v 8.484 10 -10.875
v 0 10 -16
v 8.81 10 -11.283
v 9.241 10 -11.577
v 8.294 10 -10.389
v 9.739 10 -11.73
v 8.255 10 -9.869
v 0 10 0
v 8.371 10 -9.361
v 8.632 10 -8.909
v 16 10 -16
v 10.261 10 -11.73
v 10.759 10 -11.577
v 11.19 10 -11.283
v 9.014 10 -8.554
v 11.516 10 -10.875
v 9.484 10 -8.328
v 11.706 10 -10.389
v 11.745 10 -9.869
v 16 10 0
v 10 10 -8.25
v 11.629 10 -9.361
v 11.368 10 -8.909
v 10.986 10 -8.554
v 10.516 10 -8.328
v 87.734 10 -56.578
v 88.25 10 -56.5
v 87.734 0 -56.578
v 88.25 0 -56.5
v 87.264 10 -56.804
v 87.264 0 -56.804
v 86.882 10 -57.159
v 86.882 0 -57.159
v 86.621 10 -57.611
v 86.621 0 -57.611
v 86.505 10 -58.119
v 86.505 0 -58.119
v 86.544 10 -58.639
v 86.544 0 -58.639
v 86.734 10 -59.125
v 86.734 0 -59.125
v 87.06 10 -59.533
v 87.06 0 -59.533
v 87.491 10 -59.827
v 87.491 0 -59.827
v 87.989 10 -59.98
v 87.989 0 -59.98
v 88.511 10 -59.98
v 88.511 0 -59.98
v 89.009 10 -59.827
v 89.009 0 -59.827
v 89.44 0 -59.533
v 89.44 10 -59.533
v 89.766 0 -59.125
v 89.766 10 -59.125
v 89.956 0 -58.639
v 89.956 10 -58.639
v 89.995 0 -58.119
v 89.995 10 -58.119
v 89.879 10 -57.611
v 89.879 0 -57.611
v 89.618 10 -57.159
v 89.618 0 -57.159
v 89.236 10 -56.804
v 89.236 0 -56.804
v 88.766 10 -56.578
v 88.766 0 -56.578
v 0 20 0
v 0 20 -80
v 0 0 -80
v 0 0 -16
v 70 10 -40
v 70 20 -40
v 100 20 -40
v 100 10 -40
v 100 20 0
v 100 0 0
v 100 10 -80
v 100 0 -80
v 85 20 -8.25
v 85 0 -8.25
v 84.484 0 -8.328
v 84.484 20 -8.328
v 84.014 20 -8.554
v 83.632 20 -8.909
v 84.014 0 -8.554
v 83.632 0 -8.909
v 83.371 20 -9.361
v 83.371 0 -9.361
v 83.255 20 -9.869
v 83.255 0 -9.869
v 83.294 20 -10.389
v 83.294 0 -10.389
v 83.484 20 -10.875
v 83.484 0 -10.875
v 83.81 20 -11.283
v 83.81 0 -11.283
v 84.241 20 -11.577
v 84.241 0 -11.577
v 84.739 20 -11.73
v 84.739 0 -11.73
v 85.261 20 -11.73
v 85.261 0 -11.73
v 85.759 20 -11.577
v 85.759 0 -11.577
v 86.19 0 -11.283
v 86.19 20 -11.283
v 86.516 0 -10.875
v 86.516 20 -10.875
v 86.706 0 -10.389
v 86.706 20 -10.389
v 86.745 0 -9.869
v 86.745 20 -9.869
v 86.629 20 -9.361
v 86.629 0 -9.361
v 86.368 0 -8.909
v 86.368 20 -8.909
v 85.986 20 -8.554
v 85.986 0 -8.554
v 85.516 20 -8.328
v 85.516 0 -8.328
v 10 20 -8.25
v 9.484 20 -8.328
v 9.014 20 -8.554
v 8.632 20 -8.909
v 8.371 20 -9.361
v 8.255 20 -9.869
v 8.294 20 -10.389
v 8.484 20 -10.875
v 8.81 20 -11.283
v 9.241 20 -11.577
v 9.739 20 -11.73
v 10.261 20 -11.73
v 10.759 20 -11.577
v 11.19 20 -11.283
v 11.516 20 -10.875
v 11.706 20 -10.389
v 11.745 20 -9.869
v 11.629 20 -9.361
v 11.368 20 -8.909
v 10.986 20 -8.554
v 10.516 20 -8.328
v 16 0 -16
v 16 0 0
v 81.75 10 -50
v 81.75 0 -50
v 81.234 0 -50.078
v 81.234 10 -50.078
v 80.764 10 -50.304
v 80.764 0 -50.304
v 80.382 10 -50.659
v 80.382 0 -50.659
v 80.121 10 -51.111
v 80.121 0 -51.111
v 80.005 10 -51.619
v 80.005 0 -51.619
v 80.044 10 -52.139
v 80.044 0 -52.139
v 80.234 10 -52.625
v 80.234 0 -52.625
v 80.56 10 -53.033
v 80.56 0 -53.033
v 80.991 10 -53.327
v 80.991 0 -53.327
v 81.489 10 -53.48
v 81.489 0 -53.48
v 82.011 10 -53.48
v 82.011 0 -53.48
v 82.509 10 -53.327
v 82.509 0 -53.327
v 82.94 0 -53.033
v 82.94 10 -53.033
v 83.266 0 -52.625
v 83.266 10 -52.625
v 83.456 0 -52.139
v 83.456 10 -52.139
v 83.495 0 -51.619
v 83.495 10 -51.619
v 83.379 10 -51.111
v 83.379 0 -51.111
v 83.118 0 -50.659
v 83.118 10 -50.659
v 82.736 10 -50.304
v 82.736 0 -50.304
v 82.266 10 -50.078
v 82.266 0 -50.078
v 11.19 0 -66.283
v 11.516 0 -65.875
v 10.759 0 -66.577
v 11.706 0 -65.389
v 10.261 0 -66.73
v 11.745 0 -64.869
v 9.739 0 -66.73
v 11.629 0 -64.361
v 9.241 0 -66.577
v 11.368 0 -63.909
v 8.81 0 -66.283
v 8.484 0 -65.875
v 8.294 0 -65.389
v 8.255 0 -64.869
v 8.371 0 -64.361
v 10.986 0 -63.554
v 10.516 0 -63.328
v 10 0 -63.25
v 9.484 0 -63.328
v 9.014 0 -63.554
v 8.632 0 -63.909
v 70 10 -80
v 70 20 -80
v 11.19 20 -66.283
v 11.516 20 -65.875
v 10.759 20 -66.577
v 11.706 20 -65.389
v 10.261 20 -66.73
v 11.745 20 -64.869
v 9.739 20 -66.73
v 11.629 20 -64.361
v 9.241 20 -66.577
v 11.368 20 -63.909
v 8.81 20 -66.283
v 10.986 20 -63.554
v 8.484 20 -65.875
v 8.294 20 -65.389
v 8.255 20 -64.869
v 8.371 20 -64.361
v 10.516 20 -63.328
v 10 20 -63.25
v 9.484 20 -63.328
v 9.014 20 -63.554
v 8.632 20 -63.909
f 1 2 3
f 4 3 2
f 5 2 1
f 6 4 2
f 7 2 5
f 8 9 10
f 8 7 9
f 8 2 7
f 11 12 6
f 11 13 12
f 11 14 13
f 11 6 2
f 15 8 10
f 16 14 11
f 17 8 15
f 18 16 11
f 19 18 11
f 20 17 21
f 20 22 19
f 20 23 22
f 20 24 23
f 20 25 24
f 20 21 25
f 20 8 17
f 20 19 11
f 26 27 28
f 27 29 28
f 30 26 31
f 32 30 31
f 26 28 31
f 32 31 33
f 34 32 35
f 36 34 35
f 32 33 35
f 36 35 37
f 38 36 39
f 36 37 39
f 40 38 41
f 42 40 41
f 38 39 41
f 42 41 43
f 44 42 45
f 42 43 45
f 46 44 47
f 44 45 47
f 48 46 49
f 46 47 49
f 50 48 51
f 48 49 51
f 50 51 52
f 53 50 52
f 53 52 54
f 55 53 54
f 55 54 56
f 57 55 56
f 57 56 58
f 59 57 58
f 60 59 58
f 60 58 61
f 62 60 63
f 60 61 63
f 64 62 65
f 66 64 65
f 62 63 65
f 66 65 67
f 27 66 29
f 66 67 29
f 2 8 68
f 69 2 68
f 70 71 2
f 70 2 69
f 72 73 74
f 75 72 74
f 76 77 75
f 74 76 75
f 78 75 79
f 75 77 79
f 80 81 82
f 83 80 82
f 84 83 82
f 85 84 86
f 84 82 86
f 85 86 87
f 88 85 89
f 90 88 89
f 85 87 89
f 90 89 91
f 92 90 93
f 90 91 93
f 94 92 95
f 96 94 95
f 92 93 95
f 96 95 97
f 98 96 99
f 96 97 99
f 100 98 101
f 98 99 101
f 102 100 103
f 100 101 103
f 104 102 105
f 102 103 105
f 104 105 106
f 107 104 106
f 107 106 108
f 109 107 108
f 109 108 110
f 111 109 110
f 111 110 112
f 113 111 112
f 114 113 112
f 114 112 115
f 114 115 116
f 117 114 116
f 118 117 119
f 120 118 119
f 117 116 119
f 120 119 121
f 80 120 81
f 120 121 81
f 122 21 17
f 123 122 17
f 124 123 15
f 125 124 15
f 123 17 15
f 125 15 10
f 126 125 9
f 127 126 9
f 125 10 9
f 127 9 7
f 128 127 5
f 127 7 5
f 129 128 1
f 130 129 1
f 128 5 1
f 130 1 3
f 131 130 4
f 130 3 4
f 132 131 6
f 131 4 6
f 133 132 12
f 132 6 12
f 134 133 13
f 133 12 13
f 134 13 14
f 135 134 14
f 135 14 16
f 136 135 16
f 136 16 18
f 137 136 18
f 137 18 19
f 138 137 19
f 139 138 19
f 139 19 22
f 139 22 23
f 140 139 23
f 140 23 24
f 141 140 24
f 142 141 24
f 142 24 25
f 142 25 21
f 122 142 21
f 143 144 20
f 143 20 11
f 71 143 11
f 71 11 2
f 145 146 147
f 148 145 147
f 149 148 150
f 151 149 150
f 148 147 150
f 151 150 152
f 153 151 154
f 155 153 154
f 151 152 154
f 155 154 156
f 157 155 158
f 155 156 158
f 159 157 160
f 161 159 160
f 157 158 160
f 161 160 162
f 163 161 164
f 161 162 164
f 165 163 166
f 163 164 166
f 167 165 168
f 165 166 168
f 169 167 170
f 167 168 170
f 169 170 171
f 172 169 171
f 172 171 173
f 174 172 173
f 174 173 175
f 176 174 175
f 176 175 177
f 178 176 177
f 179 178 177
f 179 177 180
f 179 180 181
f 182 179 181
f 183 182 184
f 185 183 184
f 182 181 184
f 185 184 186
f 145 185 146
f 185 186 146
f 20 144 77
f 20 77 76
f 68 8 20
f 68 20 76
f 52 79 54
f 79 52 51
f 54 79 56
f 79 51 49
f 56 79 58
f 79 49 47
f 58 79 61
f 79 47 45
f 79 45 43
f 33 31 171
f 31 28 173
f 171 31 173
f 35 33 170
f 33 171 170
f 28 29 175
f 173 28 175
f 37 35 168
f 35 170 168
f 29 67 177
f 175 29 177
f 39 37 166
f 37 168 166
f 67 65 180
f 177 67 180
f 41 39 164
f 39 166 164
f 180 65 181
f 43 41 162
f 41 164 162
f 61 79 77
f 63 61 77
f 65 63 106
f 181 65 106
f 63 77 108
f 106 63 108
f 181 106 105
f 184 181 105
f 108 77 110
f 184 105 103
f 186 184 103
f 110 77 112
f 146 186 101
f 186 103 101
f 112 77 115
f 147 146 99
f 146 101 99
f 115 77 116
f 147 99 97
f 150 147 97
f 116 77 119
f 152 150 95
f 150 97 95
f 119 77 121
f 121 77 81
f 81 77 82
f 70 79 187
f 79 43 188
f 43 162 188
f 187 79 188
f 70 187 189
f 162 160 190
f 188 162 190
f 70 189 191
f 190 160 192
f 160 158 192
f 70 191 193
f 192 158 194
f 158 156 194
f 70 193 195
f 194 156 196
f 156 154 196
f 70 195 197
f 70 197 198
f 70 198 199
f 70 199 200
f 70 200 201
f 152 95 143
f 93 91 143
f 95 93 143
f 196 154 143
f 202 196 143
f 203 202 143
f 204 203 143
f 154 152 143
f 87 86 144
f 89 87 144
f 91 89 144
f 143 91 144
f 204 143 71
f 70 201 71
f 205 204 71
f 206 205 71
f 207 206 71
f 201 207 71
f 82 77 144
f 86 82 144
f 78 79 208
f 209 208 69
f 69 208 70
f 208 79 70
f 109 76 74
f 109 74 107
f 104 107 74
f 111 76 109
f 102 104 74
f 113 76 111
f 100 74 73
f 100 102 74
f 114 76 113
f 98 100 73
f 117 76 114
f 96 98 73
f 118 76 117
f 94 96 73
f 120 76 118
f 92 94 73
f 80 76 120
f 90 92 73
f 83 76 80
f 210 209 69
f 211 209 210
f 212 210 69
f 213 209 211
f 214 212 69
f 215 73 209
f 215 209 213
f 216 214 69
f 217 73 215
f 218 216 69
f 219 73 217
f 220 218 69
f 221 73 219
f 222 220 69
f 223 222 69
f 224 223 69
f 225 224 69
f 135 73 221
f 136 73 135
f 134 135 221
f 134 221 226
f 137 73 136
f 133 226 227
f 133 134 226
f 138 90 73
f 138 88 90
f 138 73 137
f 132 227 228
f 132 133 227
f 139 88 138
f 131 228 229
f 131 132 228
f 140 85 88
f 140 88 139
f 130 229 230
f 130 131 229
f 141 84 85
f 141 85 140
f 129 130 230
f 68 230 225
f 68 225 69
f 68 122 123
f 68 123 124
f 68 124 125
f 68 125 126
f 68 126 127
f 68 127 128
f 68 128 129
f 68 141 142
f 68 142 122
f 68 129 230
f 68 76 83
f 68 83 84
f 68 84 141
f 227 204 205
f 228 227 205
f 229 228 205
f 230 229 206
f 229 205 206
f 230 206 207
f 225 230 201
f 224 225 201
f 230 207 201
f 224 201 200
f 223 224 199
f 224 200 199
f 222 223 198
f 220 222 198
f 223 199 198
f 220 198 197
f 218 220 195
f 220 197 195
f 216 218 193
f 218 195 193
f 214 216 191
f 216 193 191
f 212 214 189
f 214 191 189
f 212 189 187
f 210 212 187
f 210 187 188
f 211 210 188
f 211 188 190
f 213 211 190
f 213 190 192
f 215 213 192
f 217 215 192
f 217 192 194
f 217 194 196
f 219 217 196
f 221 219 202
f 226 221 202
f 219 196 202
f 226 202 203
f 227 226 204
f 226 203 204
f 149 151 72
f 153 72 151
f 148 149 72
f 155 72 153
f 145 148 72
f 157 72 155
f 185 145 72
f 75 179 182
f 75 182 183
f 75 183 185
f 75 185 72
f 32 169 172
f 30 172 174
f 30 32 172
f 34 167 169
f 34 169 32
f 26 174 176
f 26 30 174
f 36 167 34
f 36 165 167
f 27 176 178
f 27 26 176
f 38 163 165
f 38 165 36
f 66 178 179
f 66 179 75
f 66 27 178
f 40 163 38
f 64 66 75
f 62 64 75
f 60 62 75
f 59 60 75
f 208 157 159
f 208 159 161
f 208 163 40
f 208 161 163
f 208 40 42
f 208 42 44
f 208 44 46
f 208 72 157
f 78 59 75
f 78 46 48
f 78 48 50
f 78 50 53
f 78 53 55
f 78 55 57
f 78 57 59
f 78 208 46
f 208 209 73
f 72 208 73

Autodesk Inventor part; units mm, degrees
ref_plane "YZ Plane" through (0, 0, 0) normal (1, 0, 0) x (0, 1, 0)
ref_plane "XZ Plane" through (0, 0, 0) normal (0, 1, 0) x (-1, 0, 0)
ref_plane "XY Plane" through (0, 0, 0) normal (0, 0, 1) x (1, 0, 0)
sketch "Boceto1" plane through (0, 0, 0) normal (0, 1, 0) x (-1, 0, 0)
  line L0 (100, 80) -> (-100, 80)
  line L1 (-100, 80) -> (-100, -80)
  line L2 (-100, -80) -> (100, -80)
  line L3 (100, -80) -> (100, 80)
  line L4 (100, 80) -> (-100, -80) construction
  line L5 (-100, 80) -> (100, -80) construction
  point P0 (0, 0)
  dimension "d0" = 200
  dimension "d1" = 160
extrude "Extrusión1" add sketch "Boceto1" along normal blind 20
sketch "Boceto2" plane through (0, 20, 0) normal (0, 1, 0) x (1, 0, 0)
  line L0 (-100, 80) -> (-100, -80) projected
  line L1 (-100, 80) -> (-70, 80)
  line L2 (-70, 80) -> (-70, 40)
  line L3 (-70, 40) -> (-100, 40)
  line L4 (-100, 40) -> (-100, 80)
  line L5 (100, 80) -> (-100, 80) projected
  line L6 (0, 80) -> (0, 40)
  line L7 (100, 80) -> (70, 80)
  line L8 (70, 80) -> (70, 40)
  line L9 (70, 40) -> (100, 40)
  line L10 (100, 40) -> (100, 80)
  point P0 (0, 0)
  dimension "d4" = 30
  dimension "d5" = 40
extrude "Extrusión2" cut sketch "Boceto2" against normal blind 10
sketch "Boceto3" plane through (0, 20, 0) normal (0, 1, 0) x (1, 0, 0)
  line L0 (-70, 80) -> (-70, 40) projected
  line L1 (-70, 80.0001) -> (-70, 40)
  line L2 (-70, 40) -> (-100, 40) projected
  line L3 (-100, 40) -> (-100, 80.0001)
  line L4 (-100, 40) -> (-70, 40)
  line L5 (-70, 40) -> (-70, 80)
  line L6 (-70, 80) -> (-100, 80)
  line L7 (-100, 80) -> (-100, 40)
  circle A0 centre (-88.25, 58.25) radius 1.75
  circle A1 centre (-81.75, 51.75) radius 1.75
  line L8 (100, 80) -> (-100, 80) projected
  line L9 (0, 80) -> (0, 56.5)
  circle A2 centre (88.25, 58.25) radius 1.75
  circle A3 centre (81.75, 51.75) radius 1.75
  point P0 (0, 0)
  point P1 (-64.3507, 80)
  point P2 (-74.3507, 0)
  point P3 (-85, 80)
  dimension "d23" = 21.75
  dimension "d24" = 11.75
  dimension "d26" = 11.75
hole "Agujero1" at (-81.75, 20, -51.75) at (-88.25, 20, -58.25) at (81.75, 20, -51.75) at (88.25, 20, -58.25) direction (0, -1, 0) diameter 3.5 end through all
sketch "Boceto4" plane through (-100, 0, 80) normal (0, 0, 1) x (1, 0, 0)
  line L0 (30, 20) -> (60, 20)
  line L1 (60, 20) -> (60, 10)
  line L2 (60, 10) -> (30, 10)
  line L3 (30, 10) -> (30, 20)
  line L4 (0, 0) -> (0, 20) projected
  line L5 (100, 0) -> (100, 10)
  line L6 (170, 20) -> (140, 20)
  line L7 (140, 20) -> (140, 10)
  line L8 (140, 10) -> (170, 10)
  line L9 (170, 10) -> (170, 20)
  dimension "d34" = 30
  dimension "d35" = 10
  dimension "d36" = 30
extrude "Extrusión3" add sketch "Boceto4" along normal blind 40
sketch "Boceto5" plane through (0, 20, 0) normal (0, 1, 0) x (1, 0, 0)
  line L0 (59.9999, -50) -> (69.9999, -50)
  line L1 (49.9999, -101.75) -> (49.9999, -79.9497)
  line L2 (59.9999, -108.25) -> (59.9999, -50)
  line L3 (40, -80) -> (69.9999, -80)
  line L4 (49.9999, -79.9497) -> (40, -80)
  circle A0 centre (51.7499, -101.75) radius 1.75
  circle A1 centre (58.2499, -108.25) radius 1.75
  line L5 (69.9999, -80) -> (69.9999, -120)
  line L6 (40, -120) -> (40, -80)
  line L7 (69.9999, -120) -> (40, -120)
  line L8 (0, -50) -> (0, -71.75)
  line L9 (-40, -120) -> (-40, -80)
  line L10 (-49.9999, -101.75) -> (-49.9999, -79.9497)
  circle A2 centre (-51.7499, -101.75) radius 1.75
  circle A3 centre (-58.2499, -108.25) radius 1.75
  line L11 (-40, -80) -> (-69.9999, -80)
  line L12 (-69.9999, -120) -> (-40, -120)
  line L13 (-69.9999, -80) -> (-69.9999, -120)
  line L14 (-59.9999, -108.25) -> (-59.9999, -50)
  line L15 (-40, -120) -> (-69.9999, -120)
  line L16 (-69.9999, -80) -> (-69.9999, -120)
  line L17 (-40, -120) -> (-70, -120) projected
  line L18 (-40, -80) -> (-40, -120) projected
  line L19 (-59.9999, -110) -> (-49.9999, -110)
  line L20 (-49.9999, -110) -> (-49.9999, -100)
  line L21 (-49.9999, -100) -> (-59.9999, -100)
  line L22 (-59.9999, -100) -> (-59.9999, -110)
  line L23 (-100, 40) -> (-100, -80) projected
  point P0 (0, 0)
  point P1 (-56.75, -68.25)
  point P2 (-63.25, -61.75)
  point P3 (63.25, -61.75)
  point P4 (56.75, -68.25)
  dimension "d45" = 3.5
  dimension "d46" = 3.5
  dimension "d39" = 10
  dimension "d40" = 10
  dimension "d41" = 40
  dimension "d42" = 0
  dimension "d43" = 6.5
  dimension "d44" = 6.5
  dimension "d47" = 11.7499
  dimension "d48" = 11.75
  dimension "d49" = 0
  dimension "d50" = 11.75
  dimension "d51" = 0
  dimension "d97" = 40.0001
hole "Agujero2" at (-58.2499, 20, 108.25) at (-51.7499, 20, 101.75) at (51.7499, 20, 101.75) at (58.2499, 20, 108.25) direction (0, -1, 0) diameter 3.5 end through all
sketch "Boceto6" plane through (0, 20, 0) normal (0, 1, 0) x (1, 0, 0)
  circle A0 centre (-60.569, -13.1067) radius 10
  circle A1 centre (-29.569, -59.1067) radius 3.5
  line L0 (-60.569, -13.1067) -> (-39.0083, -13.1067)
  circle A2 centre (-29.569, 25.8933) radius 3.5
  circle A3 centre (-88.569, 25.8933) radius 3.5
  circle A4 centre (-88.569, -59.1067) radius 3.5
  line L1 (70.4544, -63.0517) -> (18.4544, -63.0517)
  line L2 (18.4544, -63.0517) -> (18.4544, 6.9483)
  line L3 (18.4544, 6.9483) -> (70.4544, 6.9483)
  line L4 (70.4544, 6.9483) -> (70.4544, -63.0517)
  line L5 (70.4544, 6.9483) -> (48.4544, 6.9483)
  line L6 (48.4544, 6.9483) -> (48.4544, 48.9483)
  line L7 (48.4544, 48.9483) -> (70.4544, 48.9483)
  line L8 (70.4544, 48.9483) -> (70.4544, 6.9483)
  line L9 (77.2288, -8.158) -> (77.2281, -5.6604)
  circle A5 centre (63.7706, -5.7606) radius 1.75
  line L10 (70.7641, -24.1464) -> (70.7641, 22.2796)
  circle A6 centre (35.8307, -5.7609) radius 1.75
  line L11 (25.1581, -13.2381) -> (25.1581, -10.7404)
  circle A7 centre (68.8507, -57.8309) radius 1.75
  line L12 (26.4277, 35.0051) -> (26.4277, 37.5029)
  circle A8 centre (20.6074, -56.5614) radius 1.75
  line L13 (18.6941, -55.9176) -> (70.7641, -55.9176)
  line L14 (18.6941, -55.9176) -> (18.6941, -7.6743)
  line L15 (44.7291, -55.9176) -> (44.7291, -31.7959)
  line L16 (63.7706, -28.0517) -> (26.4277, -28.0517)
  line L17 (44.7291, -23.5247) -> (44.7291, -31.7959)
  point P0 (0, 0)
  point P1 (-60.569, -16.6067)
  point P2 (45.425, 12.8886)
  point P3 (44.7291, -28.0517)
  dimension "d59" = 7
  dimension "d60" = 7
  dimension "d61" = 7
  dimension "d62" = 39
  dimension "d63" = 46
  dimension "d64" = 59
  dimension "d65" = 46
  dimension "d66" = 39
  dimension "d67" = 59
  dimension "d68" = 52
  dimension "d69" = 70
  dimension "d70" = 22
  dimension "d71" = 42
  dimension "d72" = 3.5
  dimension "d73" = 3.5
  dimension "d74" = 3.5
  dimension "d75" = 3.5
  dimension "d142" = 17.3763
  dimension "d143" = 12.7092
  dimension "d144" = 6.6837
  dimension "d145" = 12.7089
  dimension "d146" = 5.2208
  dimension "d147" = 1.6037
  dimension "d148" = 2.1531
  dimension "d149" = 6.4903
hole "Agujero3" at (68.8507, 20, 57.8309) at (20.6074, 20, 56.5614) at (63.7706, 20, 5.7606) at (35.8307, 20, 5.7609) direction (0, -1, 0) diameter 3.5 end through all
sketch "Boceto7" plane through (0, 20, 0) normal (0, 1, 0) x (1, 0, 0)
  circle A0 centre (-60.569, -13.1067) radius 10
  circle A1 centre (-29.569, -59.1067) radius 3.5
  line L0 (-60.569, -13.1067) -> (-39.0083, -13.1067)
  circle A2 centre (-29.569, 25.8933) radius 3.5
  circle A3 centre (-88.569, 25.8933) radius 3.5
  circle A4 centre (-88.569, -59.1067) radius 3.5
  point P0 (0, 0)
  point P1 (-60.569, -16.6067)
  dimension "d83" = 7
  dimension "d84" = 7
  dimension "d85" = 7
  dimension "d86" = 39
  dimension "d87" = 46
  dimension "d88" = 59
  dimension "d89" = 46
  dimension "d90" = 39
  dimension "d91" = 59
extrude "Extrusión4" cut sketch "Boceto7" against normal blind 20
ref_plane "Plano de trabajo1" through (0, 0, -80) normal (-1, 0, 0) x (0, 0, 1)
ref_plane "Plano de trabajo2" through (100, 0, 0) normal (0, 0, -1) x (-1, 0, 0)
sketch "Boceto8" plane through (0, 20, 0) normal (0, 1, 0) x (1, 0, 0)
  line L0 (80, -15) -> (90, -15)
  circle A0 centre (85, -10) radius 1.75
  line L1 (85, 10) -> (85, -10)
  line L2 (90, -15) -> (90, 15)
  circle A1 centre (85, 10) radius 1.75
  line L3 (80, 15) -> (80, -15)
  line L4 (90, 15) -> (80, -15) construction
  line L5 (80, 15) -> (90, -15) construction
  line L6 (90, 15) -> (80, 15)
  line L7 (100, -80) -> (100, 40) projected
  line L8 (0, 0) -> (20, -20)
  line L9 (0, 0) -> (28.2843, 0) construction
  line L10 (15, -60) -> (15, -70)
  circle A2 centre (10, -65) radius 1.75
  line L11 (-10, -65) -> (10, -65)
  line L12 (15, -70) -> (-15, -70)
  circle A3 centre (-10, -65) radius 1.75
  line L13 (-15, -60) -> (15, -60)
  line L14 (-15, -70) -> (15, -60) construction
  line L15 (-15, -60) -> (15, -70) construction
  line L16 (-15, -70) -> (-15, -60)
  line L17 (0, 0) -> (18.6615, 18.6615)
  line L18 (0, 0) -> (26.3913, 0) construction
  line L19 (-15, 60) -> (-15, 70)
  circle A4 centre (-10, 65) radius 1.75
  line L20 (10, 65) -> (-10, 65)
  line L21 (-15, 70) -> (15, 70)
  circle A5 centre (10, 65) radius 1.75
  line L22 (15, 60) -> (-15, 60)
  line L23 (15, 70) -> (-15, 60) construction
  line L24 (15, 60) -> (-15, 70) construction
  line L25 (15, 70) -> (15, 60)
  line L26 (70, 80) -> (-70, 80) projected
  line L27 (-40, -80) -> (40, -80) projected
  point P0 (86.9608, 0)
  point P1 (86.9608, 0)
  point P2 (85, 15)
  point P3 (0, -69.1269)
  point P4 (0, -69.1269)
  point P5 (-15, -67.1661)
  point P6 (0, 69.7066)
  point P7 (0, 69.7066)
  point P8 (15, 67.7458)
  point P9 (-15, 65)
  point P10 (15, -65)
  dimension "d98" = 10
  dimension "d99" = 30
  dimension "d100" = 10
  dimension "d101" = 5
  dimension "d102" = 5
  dimension "d103" = 5
  dimension "d104" = 5
  dimension "d105" = 45
  dimension "d106" = 45
  dimension "d107" = 10
  dimension "d108" = 10
  dimension "d109" = 30
  dimension "d110" = 5
  dimension "d111" = 5
  dimension "d112" = 5
  dimension "d113" = 5
  dimension "d114" = 10
  dimension "d115" = 30
  dimension "d116" = 5
  dimension "d117" = 5
  dimension "d118" = 5
  dimension "d119" = 5
  dimension "d120" = 10
hole "Agujero4" at (-10, 20, -65) at (10, 20, -65) at (85, 20, -10) at (85, 20, 10) at (10, 20, 65) at (-10, 20, 65) direction (0, -1, 0) diameter 3.5 end through all
sketch "Boceto9" plane through (0, 20, 0) normal (0, 1, 0) x (1, 0, 0)
  circle A0 centre (10, -10) radius 1.75
  line L0 (6.803, 0) -> (14.6069, 0)
  line L1 (0, 0) -> (0, -4.8284)
  line L2 (0, 0) -> (20.0354, 0)
  circle A1 centre (10, 10) radius 1.75
  line L3 (0, 0) -> (0, 4.8284)
  circle A2 centre (-10, 10) radius 1.75
  circle A3 centre (-10, -10) radius 1.75
  dimension "d128" = 3.5
  dimension "d129" = 10
  dimension "d130" = 10
hole "Agujero5" at (-10, 20, 10) at (-10, 20, -10) at (10, 20, -10) at (10, 20, 10) direction (0, -1, 0) diameter 3.5 end through all
sketch "Boceto10" plane through (0, 0, 0) normal (0, -1, 0) x (1, 0, 0)
  line L0 (-16, 16) -> (16, 16)
  line L1 (16, 16) -> (16, -16)
  line L2 (16, -16) -> (-16, -16)
  line L3 (-16, -16) -> (-16, 16)
  line L4 (-16, 16) -> (16, -16) construction
  line L5 (16, 16) -> (-16, -16) construction
  point P0 (0, 0)
  point P1 (0, 0)
  dimension "d138" = 32
  dimension "d139" = 32
extrude "Extrusión5" cut sketch "Boceto10" against normal blind 10
split "Dividir1" plane through (100, 0, 0) removes the side toward (0, 0, 1)
split "Dividir2" plane through (0, 0, -80) removes the side toward (-1, 0, 0)
properties part number "base_mid_2"
